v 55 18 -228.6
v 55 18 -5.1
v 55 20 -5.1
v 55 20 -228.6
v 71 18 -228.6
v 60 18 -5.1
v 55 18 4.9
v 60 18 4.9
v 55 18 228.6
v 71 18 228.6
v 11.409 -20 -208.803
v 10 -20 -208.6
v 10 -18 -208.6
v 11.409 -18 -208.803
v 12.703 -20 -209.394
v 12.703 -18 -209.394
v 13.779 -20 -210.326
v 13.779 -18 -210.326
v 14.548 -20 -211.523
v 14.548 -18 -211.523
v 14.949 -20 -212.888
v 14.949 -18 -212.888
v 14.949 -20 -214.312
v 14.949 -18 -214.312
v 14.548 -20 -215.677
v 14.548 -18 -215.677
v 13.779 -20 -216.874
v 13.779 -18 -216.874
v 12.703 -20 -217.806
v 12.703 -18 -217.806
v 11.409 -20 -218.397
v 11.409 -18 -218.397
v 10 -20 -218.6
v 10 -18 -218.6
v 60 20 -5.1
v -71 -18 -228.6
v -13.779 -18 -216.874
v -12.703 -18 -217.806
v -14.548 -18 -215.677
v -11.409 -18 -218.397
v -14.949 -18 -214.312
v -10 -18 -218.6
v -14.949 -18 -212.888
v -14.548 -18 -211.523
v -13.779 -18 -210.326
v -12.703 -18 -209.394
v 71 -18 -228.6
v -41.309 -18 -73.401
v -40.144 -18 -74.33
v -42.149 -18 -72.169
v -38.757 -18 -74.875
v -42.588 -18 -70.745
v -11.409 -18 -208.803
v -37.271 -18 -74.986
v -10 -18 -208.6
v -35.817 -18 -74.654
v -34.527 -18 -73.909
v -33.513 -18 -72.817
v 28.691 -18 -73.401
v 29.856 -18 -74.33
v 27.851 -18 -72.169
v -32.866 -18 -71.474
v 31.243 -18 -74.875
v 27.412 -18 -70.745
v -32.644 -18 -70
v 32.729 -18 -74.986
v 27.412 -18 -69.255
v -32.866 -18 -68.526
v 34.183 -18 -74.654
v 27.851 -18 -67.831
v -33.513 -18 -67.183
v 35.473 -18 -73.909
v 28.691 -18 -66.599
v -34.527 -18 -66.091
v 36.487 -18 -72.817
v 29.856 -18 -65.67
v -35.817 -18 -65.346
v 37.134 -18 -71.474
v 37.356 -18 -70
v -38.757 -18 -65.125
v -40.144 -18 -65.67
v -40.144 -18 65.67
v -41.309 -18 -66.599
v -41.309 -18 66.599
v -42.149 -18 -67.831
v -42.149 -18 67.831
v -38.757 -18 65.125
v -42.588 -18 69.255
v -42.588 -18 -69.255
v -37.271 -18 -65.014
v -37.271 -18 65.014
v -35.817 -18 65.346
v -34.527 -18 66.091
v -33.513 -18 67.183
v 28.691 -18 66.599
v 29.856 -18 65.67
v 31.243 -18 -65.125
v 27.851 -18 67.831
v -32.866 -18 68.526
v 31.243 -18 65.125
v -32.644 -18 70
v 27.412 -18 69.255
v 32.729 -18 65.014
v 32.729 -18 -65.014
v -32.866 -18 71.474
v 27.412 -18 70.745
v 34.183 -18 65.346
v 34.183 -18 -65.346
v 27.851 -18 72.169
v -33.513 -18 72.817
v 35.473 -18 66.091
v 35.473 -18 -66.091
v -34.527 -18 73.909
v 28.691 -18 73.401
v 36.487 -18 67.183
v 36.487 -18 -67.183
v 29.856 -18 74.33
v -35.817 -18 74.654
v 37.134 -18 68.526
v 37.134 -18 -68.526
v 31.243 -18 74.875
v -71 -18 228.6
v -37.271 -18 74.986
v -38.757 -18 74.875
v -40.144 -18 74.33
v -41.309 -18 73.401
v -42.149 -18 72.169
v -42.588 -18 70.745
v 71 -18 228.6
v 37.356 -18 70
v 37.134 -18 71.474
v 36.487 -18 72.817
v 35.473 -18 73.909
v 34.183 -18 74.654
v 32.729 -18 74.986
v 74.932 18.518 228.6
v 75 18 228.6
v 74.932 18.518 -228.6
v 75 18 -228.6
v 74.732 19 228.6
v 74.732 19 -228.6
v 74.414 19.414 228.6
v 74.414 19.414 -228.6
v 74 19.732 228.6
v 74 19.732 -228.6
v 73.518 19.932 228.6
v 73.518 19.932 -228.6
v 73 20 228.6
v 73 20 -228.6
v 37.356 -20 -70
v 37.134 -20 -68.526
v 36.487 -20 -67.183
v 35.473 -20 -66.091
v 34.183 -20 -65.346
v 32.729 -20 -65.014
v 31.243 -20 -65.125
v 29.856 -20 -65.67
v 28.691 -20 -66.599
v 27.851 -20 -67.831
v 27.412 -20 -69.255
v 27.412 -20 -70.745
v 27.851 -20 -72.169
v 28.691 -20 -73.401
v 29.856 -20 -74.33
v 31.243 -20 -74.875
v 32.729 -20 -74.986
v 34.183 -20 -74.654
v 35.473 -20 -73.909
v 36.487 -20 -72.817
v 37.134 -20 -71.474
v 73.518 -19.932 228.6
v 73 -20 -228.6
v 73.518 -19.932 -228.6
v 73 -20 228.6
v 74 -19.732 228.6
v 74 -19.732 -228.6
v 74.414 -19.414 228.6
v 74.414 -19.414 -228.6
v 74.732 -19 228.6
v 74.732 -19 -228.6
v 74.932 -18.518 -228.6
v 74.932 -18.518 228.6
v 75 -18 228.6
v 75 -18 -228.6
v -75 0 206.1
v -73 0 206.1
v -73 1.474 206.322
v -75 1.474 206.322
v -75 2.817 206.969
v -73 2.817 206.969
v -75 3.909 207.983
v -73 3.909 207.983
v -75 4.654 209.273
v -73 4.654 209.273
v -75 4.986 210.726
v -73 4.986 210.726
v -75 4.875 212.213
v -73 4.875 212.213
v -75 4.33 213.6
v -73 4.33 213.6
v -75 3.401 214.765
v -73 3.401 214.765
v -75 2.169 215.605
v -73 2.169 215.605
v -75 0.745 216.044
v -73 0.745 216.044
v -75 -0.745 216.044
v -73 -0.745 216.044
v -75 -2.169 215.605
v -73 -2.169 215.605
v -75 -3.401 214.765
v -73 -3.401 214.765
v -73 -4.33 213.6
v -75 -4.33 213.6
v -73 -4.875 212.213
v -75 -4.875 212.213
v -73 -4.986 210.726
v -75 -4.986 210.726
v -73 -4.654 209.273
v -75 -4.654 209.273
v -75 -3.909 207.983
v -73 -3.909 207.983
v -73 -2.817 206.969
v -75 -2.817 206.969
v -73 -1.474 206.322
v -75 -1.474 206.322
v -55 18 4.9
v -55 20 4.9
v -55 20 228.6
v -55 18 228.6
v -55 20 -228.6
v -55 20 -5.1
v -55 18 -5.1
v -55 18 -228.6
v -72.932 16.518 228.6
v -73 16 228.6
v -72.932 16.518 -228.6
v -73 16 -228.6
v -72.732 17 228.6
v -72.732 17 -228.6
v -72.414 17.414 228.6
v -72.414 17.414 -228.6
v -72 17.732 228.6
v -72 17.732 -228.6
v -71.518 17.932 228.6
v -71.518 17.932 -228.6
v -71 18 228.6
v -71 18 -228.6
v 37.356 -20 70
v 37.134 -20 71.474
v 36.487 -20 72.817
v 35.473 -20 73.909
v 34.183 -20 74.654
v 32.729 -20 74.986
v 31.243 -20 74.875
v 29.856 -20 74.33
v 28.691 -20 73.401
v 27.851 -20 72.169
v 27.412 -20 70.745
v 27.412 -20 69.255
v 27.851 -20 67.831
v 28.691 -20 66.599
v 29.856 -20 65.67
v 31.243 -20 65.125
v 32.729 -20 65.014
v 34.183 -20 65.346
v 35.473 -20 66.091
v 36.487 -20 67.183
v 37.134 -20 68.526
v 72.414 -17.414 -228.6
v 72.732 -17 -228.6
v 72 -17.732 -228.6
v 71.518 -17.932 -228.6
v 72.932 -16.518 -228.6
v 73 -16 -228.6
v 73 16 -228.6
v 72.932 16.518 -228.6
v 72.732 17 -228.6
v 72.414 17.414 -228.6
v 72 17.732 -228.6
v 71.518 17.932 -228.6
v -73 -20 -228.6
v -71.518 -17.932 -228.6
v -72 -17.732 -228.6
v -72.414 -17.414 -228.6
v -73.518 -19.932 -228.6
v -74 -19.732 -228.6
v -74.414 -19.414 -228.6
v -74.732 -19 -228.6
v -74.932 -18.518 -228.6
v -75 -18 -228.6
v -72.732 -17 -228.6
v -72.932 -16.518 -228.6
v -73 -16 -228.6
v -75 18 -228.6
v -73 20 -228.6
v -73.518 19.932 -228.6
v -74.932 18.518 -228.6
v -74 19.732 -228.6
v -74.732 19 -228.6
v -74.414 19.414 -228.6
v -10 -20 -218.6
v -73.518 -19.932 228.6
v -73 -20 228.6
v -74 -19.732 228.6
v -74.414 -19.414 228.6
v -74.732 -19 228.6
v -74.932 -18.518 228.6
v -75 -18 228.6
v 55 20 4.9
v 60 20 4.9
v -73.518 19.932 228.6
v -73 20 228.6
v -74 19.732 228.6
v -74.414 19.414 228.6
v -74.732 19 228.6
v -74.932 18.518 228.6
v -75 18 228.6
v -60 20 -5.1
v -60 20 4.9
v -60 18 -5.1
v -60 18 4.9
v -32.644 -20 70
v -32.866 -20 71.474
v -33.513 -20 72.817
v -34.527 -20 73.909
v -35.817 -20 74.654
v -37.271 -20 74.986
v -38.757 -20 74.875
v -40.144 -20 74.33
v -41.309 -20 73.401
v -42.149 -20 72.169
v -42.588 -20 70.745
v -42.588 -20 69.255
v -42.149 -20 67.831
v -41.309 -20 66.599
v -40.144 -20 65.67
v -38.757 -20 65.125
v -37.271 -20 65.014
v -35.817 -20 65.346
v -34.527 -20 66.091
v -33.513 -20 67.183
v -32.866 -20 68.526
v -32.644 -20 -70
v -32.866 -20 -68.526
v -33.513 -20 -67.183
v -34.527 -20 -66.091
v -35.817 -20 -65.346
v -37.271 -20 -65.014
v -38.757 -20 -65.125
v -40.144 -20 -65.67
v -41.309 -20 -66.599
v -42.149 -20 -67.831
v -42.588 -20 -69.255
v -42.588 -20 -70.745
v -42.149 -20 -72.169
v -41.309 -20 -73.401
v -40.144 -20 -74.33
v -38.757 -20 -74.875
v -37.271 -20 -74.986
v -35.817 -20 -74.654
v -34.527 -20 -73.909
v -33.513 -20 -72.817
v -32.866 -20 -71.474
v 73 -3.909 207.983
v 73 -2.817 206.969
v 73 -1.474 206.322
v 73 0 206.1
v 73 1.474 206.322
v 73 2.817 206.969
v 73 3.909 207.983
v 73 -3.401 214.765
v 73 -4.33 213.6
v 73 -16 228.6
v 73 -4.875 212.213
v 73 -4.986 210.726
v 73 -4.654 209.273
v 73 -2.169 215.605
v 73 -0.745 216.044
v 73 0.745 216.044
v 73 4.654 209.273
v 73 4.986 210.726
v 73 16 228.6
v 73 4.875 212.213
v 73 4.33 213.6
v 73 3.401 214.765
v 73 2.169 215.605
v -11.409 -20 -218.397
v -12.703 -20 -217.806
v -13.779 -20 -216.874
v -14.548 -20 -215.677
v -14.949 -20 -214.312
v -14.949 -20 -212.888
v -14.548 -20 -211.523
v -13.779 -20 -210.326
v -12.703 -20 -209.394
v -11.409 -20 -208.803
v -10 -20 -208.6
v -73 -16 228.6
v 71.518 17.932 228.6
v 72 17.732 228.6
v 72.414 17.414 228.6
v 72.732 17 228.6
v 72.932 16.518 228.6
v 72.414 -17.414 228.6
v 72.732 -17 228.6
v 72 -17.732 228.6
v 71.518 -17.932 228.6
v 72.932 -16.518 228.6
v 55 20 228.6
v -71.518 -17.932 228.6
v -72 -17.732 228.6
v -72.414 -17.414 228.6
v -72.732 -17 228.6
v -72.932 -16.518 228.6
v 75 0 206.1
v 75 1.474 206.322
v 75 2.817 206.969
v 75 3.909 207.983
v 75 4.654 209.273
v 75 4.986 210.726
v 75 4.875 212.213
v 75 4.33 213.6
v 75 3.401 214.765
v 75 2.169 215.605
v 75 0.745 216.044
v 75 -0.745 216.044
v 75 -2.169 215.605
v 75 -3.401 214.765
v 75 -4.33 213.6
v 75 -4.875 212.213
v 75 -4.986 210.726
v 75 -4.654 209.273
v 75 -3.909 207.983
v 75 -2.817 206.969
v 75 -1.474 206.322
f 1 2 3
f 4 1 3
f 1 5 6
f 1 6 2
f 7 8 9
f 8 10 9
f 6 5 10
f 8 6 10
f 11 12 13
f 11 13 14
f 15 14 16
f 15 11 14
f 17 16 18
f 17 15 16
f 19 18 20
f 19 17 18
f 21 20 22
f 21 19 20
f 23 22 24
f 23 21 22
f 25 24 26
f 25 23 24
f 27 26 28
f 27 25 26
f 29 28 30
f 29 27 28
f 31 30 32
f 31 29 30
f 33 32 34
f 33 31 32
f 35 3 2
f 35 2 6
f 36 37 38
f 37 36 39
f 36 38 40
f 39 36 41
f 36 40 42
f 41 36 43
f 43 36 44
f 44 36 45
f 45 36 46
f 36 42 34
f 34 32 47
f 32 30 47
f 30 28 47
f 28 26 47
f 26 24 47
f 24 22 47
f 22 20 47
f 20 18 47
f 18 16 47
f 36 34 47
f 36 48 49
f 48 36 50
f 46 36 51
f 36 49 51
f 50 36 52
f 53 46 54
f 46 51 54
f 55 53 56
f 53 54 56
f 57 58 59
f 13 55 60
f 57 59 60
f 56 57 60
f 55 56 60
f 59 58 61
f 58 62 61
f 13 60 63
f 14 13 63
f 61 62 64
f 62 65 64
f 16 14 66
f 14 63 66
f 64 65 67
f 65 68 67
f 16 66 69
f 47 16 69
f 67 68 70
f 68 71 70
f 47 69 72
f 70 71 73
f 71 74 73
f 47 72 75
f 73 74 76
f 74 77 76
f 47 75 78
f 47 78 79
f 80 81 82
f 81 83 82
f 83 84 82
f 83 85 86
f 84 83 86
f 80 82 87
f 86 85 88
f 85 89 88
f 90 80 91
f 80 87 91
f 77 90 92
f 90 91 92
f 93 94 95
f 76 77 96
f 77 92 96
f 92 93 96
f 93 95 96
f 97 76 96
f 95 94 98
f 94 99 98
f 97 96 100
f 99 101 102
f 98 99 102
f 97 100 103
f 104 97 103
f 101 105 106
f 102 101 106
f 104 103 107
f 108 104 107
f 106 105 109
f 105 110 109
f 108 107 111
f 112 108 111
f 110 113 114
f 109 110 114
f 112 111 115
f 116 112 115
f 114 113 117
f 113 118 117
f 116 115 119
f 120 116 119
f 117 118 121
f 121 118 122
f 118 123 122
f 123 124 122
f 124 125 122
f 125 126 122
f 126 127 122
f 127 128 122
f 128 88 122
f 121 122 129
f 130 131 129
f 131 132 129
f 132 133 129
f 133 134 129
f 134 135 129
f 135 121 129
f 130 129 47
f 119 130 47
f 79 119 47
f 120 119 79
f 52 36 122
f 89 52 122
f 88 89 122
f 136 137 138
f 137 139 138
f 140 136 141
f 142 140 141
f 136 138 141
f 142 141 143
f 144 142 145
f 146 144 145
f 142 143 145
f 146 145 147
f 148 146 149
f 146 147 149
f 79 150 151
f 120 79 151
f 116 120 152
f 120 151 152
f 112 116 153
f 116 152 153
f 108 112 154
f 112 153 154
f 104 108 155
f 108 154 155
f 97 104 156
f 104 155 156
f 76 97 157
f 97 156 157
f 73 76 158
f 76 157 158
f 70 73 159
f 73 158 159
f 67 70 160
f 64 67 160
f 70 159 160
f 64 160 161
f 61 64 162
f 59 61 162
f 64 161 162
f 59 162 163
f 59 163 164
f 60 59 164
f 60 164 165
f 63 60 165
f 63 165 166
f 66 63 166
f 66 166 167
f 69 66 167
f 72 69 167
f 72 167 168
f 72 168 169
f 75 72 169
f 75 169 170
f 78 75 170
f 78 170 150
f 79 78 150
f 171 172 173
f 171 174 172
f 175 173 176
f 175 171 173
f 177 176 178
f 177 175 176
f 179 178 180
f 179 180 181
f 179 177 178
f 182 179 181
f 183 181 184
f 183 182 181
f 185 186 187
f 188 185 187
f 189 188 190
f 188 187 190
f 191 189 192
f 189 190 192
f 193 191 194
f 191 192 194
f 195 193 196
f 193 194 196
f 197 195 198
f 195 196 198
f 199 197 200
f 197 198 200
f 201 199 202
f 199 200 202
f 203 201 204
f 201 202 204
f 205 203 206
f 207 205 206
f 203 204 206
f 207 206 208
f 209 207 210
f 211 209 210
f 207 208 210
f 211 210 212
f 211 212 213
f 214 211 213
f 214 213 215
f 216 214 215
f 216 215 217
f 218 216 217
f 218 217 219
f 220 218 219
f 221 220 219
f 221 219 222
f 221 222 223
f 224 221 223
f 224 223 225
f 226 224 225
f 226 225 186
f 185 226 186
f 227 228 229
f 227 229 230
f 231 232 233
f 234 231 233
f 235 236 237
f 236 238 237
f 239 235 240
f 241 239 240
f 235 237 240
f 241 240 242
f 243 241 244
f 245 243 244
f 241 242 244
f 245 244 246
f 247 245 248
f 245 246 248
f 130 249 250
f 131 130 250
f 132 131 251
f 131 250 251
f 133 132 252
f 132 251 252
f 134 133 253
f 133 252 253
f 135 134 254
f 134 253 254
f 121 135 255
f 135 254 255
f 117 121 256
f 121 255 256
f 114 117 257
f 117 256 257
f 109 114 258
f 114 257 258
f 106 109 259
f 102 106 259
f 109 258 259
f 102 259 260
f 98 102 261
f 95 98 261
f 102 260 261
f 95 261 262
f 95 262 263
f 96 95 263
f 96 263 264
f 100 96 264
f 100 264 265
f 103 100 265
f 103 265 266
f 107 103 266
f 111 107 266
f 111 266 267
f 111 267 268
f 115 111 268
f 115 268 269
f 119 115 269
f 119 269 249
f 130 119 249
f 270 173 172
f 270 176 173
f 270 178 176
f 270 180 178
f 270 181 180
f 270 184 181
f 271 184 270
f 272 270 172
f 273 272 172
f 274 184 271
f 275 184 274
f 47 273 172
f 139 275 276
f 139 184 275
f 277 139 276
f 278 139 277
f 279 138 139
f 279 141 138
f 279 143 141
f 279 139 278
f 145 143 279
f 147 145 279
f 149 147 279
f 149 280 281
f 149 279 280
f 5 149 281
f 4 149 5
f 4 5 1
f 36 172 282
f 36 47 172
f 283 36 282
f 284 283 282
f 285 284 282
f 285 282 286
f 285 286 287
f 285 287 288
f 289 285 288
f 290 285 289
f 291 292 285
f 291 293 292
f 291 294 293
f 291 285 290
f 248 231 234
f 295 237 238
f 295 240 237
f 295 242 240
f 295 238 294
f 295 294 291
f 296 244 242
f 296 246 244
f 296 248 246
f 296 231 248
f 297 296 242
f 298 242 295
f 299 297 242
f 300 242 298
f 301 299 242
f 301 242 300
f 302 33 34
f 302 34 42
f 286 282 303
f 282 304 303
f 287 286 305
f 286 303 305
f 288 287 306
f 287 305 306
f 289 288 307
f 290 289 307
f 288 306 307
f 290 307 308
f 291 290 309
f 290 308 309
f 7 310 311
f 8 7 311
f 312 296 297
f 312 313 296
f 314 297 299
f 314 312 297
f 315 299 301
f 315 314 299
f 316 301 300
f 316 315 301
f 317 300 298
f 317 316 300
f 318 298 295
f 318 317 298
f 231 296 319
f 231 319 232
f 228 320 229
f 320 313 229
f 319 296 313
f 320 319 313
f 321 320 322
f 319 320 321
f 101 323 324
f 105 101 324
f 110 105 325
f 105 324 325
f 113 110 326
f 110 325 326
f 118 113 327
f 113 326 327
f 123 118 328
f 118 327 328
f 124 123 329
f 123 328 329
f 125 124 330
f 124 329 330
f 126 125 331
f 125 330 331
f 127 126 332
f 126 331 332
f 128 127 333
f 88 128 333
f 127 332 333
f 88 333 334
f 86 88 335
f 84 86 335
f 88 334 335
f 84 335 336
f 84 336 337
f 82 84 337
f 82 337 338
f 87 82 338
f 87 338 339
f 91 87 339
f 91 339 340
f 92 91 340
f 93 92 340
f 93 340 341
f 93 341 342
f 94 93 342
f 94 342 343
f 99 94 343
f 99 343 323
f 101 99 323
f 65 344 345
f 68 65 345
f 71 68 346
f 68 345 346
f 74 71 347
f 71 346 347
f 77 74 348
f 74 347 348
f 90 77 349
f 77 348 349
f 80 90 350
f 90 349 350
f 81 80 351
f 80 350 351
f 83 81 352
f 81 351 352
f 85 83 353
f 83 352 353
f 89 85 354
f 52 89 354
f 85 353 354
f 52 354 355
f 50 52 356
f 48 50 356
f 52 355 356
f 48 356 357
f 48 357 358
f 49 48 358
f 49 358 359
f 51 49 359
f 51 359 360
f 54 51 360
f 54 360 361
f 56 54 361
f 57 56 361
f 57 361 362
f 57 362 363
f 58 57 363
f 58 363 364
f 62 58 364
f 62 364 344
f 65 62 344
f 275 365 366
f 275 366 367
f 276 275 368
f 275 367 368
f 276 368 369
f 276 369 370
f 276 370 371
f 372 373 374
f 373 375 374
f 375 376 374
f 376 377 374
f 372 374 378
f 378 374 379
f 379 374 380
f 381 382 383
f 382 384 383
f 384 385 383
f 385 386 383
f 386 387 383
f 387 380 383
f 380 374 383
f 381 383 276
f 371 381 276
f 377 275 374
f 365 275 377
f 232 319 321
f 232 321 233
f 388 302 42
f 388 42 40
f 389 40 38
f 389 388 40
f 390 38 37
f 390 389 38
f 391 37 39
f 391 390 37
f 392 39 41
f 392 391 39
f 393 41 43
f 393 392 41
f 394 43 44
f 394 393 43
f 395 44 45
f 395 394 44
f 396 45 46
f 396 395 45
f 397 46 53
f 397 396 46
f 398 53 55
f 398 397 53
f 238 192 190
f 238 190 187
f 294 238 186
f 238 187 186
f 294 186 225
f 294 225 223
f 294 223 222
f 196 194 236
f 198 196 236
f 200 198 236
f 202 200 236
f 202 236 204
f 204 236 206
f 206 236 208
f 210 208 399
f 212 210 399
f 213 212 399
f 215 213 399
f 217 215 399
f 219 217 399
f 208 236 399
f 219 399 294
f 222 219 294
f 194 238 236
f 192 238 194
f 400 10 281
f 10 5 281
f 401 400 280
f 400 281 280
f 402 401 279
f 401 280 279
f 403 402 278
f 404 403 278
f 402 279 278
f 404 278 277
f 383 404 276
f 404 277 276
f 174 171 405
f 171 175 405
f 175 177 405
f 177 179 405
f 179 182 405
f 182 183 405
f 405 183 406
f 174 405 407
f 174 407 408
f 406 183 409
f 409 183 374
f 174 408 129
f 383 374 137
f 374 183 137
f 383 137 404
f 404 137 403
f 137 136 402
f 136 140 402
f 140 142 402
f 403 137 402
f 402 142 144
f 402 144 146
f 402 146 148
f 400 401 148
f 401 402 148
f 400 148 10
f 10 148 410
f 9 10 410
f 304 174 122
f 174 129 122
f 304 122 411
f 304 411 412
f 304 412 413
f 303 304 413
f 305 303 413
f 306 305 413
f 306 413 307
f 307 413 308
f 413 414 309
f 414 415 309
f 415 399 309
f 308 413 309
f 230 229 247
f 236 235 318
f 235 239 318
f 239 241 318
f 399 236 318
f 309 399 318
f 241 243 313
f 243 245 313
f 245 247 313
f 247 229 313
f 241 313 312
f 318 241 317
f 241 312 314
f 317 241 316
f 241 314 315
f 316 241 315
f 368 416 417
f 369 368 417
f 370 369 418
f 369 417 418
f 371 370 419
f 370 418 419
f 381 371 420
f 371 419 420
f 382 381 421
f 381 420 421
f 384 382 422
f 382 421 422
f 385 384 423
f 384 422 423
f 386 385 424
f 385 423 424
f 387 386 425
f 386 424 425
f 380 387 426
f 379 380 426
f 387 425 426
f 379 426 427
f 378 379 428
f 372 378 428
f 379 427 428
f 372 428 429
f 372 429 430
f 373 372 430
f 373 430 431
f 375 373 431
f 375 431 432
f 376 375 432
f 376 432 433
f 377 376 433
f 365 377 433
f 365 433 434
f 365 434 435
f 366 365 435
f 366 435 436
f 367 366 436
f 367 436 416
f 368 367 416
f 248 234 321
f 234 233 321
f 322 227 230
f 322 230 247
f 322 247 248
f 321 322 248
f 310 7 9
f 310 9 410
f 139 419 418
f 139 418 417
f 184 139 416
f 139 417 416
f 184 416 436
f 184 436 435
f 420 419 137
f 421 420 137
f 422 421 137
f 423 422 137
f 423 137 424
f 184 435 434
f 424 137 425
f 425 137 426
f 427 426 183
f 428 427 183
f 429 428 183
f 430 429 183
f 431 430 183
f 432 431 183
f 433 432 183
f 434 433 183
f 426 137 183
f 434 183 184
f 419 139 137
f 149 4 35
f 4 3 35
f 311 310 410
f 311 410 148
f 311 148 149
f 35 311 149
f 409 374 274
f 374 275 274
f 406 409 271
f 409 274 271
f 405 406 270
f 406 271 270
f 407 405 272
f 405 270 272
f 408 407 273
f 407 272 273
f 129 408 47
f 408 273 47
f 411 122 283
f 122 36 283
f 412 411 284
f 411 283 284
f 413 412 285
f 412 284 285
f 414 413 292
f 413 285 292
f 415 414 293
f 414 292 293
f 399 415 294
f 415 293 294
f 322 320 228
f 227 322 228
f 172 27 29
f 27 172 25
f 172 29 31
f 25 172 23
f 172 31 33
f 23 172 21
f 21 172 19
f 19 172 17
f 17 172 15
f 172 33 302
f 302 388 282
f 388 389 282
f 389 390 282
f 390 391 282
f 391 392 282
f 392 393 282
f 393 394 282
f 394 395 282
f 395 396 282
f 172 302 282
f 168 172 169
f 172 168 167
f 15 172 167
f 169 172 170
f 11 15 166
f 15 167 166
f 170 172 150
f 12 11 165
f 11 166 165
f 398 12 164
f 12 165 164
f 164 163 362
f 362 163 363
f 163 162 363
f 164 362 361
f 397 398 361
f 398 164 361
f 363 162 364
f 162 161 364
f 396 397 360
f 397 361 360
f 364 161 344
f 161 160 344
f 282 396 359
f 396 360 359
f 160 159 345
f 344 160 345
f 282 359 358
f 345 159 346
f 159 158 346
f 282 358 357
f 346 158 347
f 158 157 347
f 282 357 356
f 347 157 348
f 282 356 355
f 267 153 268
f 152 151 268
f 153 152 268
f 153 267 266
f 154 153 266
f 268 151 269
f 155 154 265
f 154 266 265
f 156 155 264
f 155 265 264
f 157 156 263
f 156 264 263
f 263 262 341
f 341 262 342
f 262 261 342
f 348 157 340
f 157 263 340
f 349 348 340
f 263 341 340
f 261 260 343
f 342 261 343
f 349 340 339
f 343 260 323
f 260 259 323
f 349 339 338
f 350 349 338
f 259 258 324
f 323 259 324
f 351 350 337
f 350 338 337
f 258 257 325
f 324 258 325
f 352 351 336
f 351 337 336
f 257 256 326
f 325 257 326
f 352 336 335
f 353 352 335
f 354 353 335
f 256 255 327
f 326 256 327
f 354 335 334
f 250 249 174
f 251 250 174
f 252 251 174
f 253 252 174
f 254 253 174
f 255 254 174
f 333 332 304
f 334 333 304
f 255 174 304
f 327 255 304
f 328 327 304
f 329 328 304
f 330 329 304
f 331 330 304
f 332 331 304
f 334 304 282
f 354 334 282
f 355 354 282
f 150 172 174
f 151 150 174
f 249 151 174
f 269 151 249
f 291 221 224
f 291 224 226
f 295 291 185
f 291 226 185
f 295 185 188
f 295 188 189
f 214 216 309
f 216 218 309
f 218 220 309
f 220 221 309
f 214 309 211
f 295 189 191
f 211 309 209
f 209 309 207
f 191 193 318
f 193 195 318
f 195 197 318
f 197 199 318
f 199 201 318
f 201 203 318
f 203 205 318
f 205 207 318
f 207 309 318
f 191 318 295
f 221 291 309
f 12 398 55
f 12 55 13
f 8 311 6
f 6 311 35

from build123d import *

# Parameters (mm, degrees)
SALIENTE_EXTRUIR2_DEPTH = 228.6
REDONDEO1_R             = 2
CROQUIS3_R              = 5
CORTAR_EXTRUIR1_DEPTH   = 151
CROQUIS4_W              = 5
CROQUIS4_H              = 10
CORTAR_EXTRUIR2_DEPTH   = 10
CROQUIS5_R              = 5
CORTAR_EXTRUIR3_DEPTH   = 10


with BuildPart() as part:
    # Croquis2 → Saliente-Extruir2 (new body, symmetric)
    with BuildSketch(Plane.XY):
        Polygon((-75, 20), (-55, 20), (-55, 18), (-73, 18), (-73, -18), (73, -18), (73, 18), (55, 18), (55, 20), (75, 20), (75, -20), (-75, -20), align=None)
    extrude(amount=SALIENTE_EXTRUIR2_DEPTH, both=True)

    # Redondeo1
    redondeo1_edges = [part.edges().sort_by_distance(p)[0] for p in [
        (75, 20, 0),
        (75, -20, 0),
        (-75, -20, 0),
        (-75, 20, 0),
        (-73, 18, 0),
        (-73, -18, 0),
        (73, -18, 0),
        (73, 18, 0),
    ]]
    fillet(redondeo1_edges, radius=REDONDEO1_R)

    # Croquis3 → Cortar-Extruir1 (cut, through all)
    with BuildSketch(Plane(origin=(75, 0, 0), x_dir=(0, 0, -1), z_dir=(1, 0, 0))):
        with Locations((-211.1, 0)):
            Circle(CROQUIS3_R)
    extrude(amount=-CORTAR_EXTRUIR1_DEPTH, mode=Mode.SUBTRACT)

    # Croquis4 → Cortar-Extruir2 (cut)
    with BuildSketch(Plane(origin=(0, 20, 0), x_dir=(1, 0, 0), z_dir=(0, 1, 0))):
        with Locations((-57.5, 0.1)):
            Rectangle(CROQUIS4_W, CROQUIS4_H)
        with Locations((57.5, 0.1)):
            Rectangle(CROQUIS4_W, CROQUIS4_H)
    extrude(amount=-CORTAR_EXTRUIR2_DEPTH, mode=Mode.SUBTRACT)

    # Croquis5 → Cortar-Extruir3 (cut)
    with BuildSketch(Plane.XZ.offset(20)):
        with Locations((-37.644195885, -70)):
            Circle(CROQUIS5_R)
        with Locations((32.355804115, -70)):
            Circle(CROQUIS5_R)
        with Locations((32.355804115, 70)):
            Circle(CROQUIS5_R)
        with Locations((-37.644195885, 70)):
            Circle(CROQUIS5_R)
        with BuildLine():
            Line((-10, -208.6), (10, -208.6))
            ThreePointArc((10, -208.6), (15, -213.6), (10, -218.6))
            Line((10, -218.6), (-10, -218.6))
            ThreePointArc((-10, -218.6), (-15, -213.6), (-10, -208.6))
        make_face()
    extrude(amount=-CORTAR_EXTRUIR3_DEPTH, mode=Mode.SUBTRACT)


solid = part.part
